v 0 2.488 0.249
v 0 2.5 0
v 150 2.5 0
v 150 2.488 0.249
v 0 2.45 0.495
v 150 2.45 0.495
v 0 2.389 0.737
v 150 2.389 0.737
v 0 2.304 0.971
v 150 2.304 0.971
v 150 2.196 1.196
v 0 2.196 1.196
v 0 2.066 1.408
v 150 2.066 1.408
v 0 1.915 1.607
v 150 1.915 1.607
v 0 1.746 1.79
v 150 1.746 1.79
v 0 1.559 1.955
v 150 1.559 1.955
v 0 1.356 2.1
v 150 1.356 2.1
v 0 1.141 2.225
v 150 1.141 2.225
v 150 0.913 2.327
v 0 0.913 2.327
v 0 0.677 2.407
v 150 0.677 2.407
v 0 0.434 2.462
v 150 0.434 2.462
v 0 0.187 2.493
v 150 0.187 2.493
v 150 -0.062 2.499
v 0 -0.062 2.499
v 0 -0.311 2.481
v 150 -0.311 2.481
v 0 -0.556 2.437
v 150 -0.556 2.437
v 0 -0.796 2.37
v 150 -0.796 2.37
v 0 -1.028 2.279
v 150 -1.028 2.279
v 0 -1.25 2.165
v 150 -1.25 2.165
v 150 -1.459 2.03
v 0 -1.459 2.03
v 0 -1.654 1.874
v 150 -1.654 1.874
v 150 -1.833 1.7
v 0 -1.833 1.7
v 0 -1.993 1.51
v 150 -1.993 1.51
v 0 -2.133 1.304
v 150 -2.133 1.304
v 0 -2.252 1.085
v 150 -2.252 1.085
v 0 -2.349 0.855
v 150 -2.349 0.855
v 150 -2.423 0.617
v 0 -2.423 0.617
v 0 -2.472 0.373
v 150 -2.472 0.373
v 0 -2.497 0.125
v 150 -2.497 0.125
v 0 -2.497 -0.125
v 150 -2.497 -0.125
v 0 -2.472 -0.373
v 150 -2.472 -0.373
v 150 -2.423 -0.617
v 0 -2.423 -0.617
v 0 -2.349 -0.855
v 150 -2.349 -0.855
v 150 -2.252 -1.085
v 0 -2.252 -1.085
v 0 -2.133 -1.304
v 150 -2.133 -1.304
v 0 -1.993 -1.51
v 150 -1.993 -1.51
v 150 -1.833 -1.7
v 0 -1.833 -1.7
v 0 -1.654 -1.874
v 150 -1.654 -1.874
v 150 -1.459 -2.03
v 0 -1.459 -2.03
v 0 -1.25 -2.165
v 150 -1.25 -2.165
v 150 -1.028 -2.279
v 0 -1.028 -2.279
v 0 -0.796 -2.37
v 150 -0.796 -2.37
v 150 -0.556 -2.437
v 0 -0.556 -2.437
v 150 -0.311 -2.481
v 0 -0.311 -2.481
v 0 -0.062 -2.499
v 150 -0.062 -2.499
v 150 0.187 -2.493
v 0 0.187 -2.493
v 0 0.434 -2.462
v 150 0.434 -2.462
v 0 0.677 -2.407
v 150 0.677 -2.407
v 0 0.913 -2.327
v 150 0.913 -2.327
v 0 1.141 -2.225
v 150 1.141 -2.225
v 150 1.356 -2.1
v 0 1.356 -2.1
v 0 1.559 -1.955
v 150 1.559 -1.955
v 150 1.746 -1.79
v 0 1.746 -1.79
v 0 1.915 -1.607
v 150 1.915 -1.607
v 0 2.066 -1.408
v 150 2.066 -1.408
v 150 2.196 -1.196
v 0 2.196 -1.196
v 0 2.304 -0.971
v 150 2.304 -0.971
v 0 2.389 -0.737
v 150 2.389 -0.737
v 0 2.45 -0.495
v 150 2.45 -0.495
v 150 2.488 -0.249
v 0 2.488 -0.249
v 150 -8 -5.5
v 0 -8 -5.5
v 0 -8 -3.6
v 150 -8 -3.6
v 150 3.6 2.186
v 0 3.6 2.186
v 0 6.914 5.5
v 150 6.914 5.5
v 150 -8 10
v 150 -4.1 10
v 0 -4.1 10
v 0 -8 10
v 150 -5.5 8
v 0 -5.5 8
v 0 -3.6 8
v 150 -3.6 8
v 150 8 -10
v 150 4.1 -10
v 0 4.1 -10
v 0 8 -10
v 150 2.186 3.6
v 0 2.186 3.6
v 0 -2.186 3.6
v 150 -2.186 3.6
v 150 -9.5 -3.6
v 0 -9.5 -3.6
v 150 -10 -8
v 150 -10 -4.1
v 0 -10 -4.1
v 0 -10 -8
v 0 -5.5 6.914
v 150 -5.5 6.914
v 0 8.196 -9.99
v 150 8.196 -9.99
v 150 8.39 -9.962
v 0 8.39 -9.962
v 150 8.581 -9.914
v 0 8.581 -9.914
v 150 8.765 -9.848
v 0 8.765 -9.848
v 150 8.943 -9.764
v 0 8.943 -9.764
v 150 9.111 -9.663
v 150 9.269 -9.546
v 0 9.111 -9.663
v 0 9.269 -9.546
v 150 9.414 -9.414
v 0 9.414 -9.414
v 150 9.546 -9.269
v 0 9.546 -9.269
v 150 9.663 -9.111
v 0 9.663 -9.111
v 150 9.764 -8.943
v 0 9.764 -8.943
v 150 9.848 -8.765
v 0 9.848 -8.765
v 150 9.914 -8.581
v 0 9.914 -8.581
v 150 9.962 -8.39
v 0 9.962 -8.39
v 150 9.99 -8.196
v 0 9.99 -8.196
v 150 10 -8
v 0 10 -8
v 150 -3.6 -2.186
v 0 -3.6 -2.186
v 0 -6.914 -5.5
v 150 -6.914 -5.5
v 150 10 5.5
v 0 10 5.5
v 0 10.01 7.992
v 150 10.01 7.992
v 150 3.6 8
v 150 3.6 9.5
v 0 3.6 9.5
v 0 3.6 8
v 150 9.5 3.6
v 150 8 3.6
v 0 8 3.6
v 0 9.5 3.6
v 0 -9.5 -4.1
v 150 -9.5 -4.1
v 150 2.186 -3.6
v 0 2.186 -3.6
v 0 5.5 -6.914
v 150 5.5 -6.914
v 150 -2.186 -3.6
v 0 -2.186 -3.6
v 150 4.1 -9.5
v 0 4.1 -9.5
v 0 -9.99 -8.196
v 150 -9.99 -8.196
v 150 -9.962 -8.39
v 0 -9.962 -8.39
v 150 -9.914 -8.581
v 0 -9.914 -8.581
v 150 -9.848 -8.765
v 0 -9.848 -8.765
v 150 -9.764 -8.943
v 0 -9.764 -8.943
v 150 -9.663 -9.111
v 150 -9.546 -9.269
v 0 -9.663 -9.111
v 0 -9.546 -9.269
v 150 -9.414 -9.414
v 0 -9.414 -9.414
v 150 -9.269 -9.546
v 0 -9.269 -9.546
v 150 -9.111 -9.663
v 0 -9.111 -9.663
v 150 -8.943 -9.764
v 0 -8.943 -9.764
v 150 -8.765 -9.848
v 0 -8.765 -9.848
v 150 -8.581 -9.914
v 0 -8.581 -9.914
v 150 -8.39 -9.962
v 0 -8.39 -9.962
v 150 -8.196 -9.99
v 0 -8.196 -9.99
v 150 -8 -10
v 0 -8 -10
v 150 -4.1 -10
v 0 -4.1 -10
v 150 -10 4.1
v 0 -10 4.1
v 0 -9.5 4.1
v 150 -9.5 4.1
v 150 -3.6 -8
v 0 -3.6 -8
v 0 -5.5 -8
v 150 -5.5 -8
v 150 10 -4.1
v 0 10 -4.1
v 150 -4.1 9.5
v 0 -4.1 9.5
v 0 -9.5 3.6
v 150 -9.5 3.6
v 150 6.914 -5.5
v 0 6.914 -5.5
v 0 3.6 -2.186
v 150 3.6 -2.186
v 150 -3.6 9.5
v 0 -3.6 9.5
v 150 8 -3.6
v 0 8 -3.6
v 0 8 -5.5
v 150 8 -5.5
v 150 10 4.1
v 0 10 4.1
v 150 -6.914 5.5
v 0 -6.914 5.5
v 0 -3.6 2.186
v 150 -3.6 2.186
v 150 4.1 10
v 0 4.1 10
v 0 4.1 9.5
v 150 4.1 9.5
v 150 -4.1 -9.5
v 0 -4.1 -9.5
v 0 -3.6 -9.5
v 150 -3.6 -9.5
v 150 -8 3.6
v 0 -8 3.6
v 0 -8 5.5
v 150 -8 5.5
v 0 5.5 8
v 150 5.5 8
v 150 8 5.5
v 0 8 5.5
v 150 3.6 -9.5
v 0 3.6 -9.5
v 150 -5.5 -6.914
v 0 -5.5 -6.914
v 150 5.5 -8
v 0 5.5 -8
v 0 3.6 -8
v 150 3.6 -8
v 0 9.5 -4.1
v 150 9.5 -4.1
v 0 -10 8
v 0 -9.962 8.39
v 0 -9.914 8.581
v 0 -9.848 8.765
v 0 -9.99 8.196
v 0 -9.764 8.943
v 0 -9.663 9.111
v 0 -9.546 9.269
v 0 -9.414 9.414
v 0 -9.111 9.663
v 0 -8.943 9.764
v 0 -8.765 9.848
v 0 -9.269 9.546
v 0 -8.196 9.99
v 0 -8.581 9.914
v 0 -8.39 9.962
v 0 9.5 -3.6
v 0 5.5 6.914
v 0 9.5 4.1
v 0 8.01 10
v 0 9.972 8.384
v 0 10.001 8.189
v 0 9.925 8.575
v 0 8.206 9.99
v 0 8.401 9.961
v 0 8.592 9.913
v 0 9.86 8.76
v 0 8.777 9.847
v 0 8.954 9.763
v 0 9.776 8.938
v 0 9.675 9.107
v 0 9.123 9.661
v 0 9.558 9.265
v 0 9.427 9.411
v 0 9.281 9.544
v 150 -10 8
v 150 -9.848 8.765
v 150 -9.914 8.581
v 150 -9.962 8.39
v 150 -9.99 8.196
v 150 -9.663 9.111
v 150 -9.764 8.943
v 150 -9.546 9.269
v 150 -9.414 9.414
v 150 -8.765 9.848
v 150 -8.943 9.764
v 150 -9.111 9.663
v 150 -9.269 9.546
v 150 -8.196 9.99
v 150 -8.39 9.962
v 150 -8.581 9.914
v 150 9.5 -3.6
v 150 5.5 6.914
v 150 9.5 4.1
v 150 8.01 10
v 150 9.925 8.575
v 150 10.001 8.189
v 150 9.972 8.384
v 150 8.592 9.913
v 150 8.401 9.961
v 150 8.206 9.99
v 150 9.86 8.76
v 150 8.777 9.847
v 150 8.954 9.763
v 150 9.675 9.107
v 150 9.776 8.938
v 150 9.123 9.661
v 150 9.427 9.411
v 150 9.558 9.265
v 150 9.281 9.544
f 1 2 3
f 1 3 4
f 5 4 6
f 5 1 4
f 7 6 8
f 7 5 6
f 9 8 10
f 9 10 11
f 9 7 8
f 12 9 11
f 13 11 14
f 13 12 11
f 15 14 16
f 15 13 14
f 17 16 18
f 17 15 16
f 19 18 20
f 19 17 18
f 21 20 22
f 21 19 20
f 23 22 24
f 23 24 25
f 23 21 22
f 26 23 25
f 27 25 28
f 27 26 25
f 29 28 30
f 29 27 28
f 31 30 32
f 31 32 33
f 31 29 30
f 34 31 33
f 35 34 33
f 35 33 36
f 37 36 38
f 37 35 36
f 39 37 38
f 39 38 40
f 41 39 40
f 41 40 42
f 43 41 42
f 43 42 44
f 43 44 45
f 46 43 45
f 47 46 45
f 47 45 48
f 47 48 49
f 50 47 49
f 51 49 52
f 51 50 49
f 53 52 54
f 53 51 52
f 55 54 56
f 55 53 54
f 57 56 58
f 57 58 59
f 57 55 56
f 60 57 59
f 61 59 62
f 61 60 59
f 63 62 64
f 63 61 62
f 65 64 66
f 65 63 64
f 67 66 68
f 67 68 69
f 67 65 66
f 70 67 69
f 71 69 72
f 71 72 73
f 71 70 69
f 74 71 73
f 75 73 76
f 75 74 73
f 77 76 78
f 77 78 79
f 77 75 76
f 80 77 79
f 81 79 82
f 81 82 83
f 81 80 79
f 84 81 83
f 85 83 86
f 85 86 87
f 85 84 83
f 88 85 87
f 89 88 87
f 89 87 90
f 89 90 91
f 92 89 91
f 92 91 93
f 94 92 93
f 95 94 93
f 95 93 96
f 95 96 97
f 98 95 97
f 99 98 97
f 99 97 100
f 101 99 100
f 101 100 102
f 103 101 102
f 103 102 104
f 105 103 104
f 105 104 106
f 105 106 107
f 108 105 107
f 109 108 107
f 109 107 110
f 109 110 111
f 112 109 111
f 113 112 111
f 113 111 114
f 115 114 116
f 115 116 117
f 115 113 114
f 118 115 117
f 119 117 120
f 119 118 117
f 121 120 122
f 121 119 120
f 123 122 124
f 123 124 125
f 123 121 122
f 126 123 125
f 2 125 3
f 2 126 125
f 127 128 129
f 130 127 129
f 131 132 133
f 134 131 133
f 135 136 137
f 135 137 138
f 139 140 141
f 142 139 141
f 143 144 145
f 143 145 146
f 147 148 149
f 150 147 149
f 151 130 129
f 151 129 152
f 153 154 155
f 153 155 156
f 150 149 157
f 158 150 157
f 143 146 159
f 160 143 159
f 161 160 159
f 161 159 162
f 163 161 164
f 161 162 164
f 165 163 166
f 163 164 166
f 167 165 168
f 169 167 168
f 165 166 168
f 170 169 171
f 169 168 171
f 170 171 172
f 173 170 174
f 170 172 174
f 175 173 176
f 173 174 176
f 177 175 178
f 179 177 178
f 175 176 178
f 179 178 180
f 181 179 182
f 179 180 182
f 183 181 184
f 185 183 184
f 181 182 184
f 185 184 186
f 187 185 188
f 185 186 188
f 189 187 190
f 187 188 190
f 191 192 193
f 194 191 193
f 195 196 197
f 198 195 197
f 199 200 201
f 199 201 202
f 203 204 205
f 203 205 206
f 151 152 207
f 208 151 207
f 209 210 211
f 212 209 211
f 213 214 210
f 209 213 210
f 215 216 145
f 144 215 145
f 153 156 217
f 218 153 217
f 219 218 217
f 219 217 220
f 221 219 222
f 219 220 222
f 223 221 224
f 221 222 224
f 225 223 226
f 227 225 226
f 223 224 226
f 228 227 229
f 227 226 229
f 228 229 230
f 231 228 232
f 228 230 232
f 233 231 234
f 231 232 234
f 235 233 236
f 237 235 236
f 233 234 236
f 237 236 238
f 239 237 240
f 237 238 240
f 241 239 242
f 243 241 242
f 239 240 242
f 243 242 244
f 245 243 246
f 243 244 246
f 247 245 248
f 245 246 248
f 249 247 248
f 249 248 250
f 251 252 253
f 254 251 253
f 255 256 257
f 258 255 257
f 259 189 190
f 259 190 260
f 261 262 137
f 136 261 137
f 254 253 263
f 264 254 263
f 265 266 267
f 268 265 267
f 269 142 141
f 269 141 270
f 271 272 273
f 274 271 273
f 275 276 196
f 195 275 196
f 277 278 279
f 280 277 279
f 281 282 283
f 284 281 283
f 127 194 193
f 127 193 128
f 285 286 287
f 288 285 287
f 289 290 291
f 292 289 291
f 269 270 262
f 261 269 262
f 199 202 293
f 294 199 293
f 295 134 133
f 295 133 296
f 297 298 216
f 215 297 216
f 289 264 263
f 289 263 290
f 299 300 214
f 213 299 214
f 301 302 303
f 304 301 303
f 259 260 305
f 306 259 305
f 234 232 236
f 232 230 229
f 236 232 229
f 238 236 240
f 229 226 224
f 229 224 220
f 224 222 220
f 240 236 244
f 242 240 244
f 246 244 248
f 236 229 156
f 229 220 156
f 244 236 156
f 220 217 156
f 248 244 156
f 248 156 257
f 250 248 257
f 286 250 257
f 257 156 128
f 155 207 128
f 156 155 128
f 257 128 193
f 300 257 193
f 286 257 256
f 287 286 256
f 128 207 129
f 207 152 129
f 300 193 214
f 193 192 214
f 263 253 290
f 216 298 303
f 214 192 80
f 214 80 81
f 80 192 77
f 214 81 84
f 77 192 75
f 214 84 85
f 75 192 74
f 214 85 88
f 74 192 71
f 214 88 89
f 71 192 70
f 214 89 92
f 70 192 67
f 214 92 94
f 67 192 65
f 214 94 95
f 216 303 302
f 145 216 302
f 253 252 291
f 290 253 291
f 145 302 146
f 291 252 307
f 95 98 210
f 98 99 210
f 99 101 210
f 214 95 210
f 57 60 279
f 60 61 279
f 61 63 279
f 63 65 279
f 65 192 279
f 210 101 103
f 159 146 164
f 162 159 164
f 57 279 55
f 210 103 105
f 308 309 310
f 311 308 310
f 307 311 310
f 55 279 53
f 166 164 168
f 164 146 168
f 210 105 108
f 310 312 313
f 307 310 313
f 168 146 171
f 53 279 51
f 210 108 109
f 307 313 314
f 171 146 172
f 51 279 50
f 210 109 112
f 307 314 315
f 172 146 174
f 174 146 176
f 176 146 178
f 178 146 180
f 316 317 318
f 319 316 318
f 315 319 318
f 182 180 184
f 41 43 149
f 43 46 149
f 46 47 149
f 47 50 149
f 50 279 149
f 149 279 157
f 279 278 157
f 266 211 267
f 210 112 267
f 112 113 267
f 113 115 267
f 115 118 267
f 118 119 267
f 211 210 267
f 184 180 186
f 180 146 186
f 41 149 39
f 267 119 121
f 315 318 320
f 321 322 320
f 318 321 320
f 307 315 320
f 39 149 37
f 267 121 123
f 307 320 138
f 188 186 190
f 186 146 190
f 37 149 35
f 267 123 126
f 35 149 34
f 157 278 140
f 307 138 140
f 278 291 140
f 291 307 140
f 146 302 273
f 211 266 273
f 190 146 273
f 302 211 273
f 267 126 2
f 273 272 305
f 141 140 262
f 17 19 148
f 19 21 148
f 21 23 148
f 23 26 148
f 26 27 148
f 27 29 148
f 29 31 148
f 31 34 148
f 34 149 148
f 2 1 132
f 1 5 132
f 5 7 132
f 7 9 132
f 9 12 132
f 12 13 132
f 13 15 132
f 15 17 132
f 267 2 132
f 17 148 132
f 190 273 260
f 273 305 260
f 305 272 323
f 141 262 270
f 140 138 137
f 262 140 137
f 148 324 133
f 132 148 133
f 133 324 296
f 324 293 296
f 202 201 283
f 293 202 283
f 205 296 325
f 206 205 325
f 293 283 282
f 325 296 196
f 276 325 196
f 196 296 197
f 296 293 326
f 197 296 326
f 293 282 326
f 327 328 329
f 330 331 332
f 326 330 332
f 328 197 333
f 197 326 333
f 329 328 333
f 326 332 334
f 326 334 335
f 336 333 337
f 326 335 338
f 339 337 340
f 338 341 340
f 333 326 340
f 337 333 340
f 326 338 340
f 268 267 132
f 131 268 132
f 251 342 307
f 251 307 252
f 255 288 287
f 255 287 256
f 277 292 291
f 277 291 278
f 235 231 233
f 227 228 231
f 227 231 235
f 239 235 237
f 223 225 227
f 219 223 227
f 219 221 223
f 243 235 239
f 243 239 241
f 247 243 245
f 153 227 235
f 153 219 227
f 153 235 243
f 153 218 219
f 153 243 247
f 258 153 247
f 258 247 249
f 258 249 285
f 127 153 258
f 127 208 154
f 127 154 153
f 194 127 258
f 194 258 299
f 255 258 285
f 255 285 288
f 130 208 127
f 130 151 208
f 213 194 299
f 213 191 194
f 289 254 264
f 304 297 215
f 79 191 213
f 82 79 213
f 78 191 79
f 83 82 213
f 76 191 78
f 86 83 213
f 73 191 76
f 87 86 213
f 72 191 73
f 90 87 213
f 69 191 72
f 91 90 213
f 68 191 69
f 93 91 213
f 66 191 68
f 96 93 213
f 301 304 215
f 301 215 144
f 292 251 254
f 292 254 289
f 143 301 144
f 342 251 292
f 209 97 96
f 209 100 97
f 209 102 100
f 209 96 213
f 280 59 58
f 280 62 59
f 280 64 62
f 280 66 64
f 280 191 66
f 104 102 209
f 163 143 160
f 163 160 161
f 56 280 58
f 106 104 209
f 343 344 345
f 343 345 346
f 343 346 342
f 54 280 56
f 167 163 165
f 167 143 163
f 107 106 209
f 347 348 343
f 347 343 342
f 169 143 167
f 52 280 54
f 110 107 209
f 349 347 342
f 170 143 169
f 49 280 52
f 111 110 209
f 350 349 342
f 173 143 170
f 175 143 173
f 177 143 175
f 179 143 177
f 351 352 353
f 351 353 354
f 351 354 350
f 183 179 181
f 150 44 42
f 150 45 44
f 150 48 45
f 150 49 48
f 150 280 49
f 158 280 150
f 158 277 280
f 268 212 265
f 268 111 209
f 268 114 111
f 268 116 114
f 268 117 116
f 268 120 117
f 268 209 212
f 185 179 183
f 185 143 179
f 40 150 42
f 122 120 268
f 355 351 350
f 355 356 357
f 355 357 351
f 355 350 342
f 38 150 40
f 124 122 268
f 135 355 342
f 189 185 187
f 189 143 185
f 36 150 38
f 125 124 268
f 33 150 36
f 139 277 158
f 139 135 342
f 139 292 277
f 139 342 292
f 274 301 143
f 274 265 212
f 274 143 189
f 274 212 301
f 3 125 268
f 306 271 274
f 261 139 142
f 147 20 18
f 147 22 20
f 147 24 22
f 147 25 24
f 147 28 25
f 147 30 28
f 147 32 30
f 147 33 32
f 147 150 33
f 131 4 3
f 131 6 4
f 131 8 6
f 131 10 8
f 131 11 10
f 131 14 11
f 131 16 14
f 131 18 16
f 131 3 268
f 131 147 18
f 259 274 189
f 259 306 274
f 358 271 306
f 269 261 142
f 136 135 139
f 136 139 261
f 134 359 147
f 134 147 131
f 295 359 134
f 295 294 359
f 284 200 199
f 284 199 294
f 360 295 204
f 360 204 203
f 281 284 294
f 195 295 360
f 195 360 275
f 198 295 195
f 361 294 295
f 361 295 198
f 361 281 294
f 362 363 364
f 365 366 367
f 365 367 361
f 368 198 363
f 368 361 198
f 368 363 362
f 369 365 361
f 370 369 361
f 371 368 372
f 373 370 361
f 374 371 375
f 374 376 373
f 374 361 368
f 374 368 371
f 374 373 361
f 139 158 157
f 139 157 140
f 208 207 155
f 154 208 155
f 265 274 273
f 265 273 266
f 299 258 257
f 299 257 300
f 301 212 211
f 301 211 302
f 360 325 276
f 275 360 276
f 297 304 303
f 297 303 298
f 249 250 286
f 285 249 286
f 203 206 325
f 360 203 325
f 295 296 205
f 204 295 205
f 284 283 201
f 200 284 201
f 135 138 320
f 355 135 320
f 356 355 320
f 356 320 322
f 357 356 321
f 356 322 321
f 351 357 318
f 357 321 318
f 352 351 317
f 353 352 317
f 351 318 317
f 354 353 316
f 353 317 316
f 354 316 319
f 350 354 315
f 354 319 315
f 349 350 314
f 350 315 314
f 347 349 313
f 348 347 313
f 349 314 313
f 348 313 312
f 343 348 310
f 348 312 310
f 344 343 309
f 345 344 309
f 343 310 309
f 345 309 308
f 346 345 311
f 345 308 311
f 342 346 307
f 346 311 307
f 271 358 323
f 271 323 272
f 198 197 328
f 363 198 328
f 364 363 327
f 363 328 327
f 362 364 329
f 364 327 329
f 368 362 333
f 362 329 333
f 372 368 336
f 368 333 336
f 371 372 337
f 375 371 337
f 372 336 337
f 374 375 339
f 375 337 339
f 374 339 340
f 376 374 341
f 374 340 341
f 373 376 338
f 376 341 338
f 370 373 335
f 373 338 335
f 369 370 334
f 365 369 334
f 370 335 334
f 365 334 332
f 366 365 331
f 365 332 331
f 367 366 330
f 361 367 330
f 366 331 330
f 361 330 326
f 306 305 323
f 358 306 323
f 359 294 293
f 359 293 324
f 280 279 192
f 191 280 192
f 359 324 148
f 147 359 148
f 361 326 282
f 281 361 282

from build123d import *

# Parameters (mm, degrees)
F0_R     = 2.5
F1_DEPTH = 150


with BuildPart() as f1:
    # F0 (on Right) → F1 (new body)
    with BuildSketch(Plane.YZ):
        with BuildLine():
            ThreePointArc((10.0095693261, 7.9923210088), (9.4265099626, 9.411496018), (8.0095840678, 10))
            Line((8.0095840678, 10), (4.1, 10))
            Line((4.1, 10), (4.1, 9.5))
            Line((4.1, 9.5), (3.6, 9.5))
            Line((3.6, 9.5), (3.6, 8))
            Line((3.6, 8), (5.5, 8))
            Line((5.5, 8), (5.5, 6.9142135624))
            Line((5.5, 6.9142135624), (2.1857864376, 3.6))
            Line((2.1857864376, 3.6), (0, 3.6))
            Line((0, 3.6), (-2.1857864376, 3.6))
            Line((-2.1857864376, 3.6), (-5.5, 6.9142135624))
            Line((-5.5, 6.9142135624), (-5.5, 8))
            Line((-5.5, 8), (-3.6, 8))
            Line((-3.6, 8), (-3.6, 9.5))
            Line((-3.6, 9.5), (-4.1, 9.5))
            Line((-4.1, 9.5), (-4.1, 10))
            Line((-4.1, 10), (-8, 10))
            ThreePointArc((-8, 10), (-9.4142135624, 9.4142135624), (-10, 8))
            Line((-10, 8), (-10, 4.1))
            Line((-10, 4.1), (-9.5, 4.1))
            Line((-9.5, 4.1), (-9.5, 3.6))
            Line((-9.5, 3.6), (-8, 3.6))
            Line((-8, 3.6), (-8, 5.5))
            Line((-8, 5.5), (-6.9142135624, 5.5))
            Line((-6.9142135624, 5.5), (-3.6, 2.1857864376))
            Line((-3.6, 2.1857864376), (-3.6, 0))
            Line((-3.6, 0), (-3.6, -2.1857864376))
            Line((-3.6, -2.1857864376), (-6.9142135624, -5.5))
            Line((-6.9142135624, -5.5), (-8, -5.5))
            Line((-8, -5.5), (-8, -3.6))
            Line((-8, -3.6), (-9.5, -3.6))
            Line((-9.5, -3.6), (-9.5, -4.1))
            Line((-9.5, -4.1), (-10, -4.1))
            Line((-10, -4.1), (-10, -8))
            ThreePointArc((-10, -8), (-9.4142135624, -9.4142135624), (-8, -10))
            Line((-8, -10), (-4.1, -10))
            Line((-4.1, -10), (-4.1, -9.5))
            Line((-4.1, -9.5), (-3.6, -9.5))
            Line((-3.6, -9.5), (-3.6, -8))
            Line((-3.6, -8), (-5.5, -8))
            Line((-5.5, -8), (-5.5, -6.9142135624))
            Line((-5.5, -6.9142135624), (-2.1857864376, -3.6))
            Line((-2.1857864376, -3.6), (0, -3.6))
            Line((0, -3.6), (2.1857864376, -3.6))
            Line((2.1857864376, -3.6), (5.5, -6.9142135624))
            Line((5.5, -6.9142135624), (5.5, -8))
            Line((5.5, -8), (3.6, -8))
            Line((3.6, -8), (3.6, -9.5))
            Line((3.6, -9.5), (4.1, -9.5))
            Line((4.1, -9.5), (4.1, -10))
            Line((4.1, -10), (8, -10))
            ThreePointArc((8, -10), (9.4142135624, -9.4142135624), (10, -8))
            Line((10, -8), (10, -4.1))
            Line((10, -4.1), (9.5, -4.1))
            Line((9.5, -4.1), (9.5, -3.6))
            Line((9.5, -3.6), (8, -3.6))
            Line((8, -3.6), (8, -5.5))
            Line((8, -5.5), (6.9142135624, -5.5))
            Line((6.9142135624, -5.5), (3.6, -2.1857864376))
            Line((3.6, -2.1857864376), (3.6, 0))
            Line((3.6, 0), (3.6, 2.1857864376))
            Line((3.6, 2.1857864376), (6.9142135624, 5.5))
            Line((6.9142135624, 5.5), (8, 5.5))
            Line((8, 5.5), (8, 3.6))
            Line((8, 3.6), (9.5, 3.6))
            Line((9.5, 3.6), (9.5, 4.1))
            Line((9.5, 4.1), (10, 4.1))
            Line((10, 4.1), (10, 5.5))
            Line((10, 5.5), (10.0095693261, 7.9923210088))
        make_face()
        Circle(F0_R, mode=Mode.SUBTRACT)
    extrude(amount=F1_DEPTH)


solid = f1.part
